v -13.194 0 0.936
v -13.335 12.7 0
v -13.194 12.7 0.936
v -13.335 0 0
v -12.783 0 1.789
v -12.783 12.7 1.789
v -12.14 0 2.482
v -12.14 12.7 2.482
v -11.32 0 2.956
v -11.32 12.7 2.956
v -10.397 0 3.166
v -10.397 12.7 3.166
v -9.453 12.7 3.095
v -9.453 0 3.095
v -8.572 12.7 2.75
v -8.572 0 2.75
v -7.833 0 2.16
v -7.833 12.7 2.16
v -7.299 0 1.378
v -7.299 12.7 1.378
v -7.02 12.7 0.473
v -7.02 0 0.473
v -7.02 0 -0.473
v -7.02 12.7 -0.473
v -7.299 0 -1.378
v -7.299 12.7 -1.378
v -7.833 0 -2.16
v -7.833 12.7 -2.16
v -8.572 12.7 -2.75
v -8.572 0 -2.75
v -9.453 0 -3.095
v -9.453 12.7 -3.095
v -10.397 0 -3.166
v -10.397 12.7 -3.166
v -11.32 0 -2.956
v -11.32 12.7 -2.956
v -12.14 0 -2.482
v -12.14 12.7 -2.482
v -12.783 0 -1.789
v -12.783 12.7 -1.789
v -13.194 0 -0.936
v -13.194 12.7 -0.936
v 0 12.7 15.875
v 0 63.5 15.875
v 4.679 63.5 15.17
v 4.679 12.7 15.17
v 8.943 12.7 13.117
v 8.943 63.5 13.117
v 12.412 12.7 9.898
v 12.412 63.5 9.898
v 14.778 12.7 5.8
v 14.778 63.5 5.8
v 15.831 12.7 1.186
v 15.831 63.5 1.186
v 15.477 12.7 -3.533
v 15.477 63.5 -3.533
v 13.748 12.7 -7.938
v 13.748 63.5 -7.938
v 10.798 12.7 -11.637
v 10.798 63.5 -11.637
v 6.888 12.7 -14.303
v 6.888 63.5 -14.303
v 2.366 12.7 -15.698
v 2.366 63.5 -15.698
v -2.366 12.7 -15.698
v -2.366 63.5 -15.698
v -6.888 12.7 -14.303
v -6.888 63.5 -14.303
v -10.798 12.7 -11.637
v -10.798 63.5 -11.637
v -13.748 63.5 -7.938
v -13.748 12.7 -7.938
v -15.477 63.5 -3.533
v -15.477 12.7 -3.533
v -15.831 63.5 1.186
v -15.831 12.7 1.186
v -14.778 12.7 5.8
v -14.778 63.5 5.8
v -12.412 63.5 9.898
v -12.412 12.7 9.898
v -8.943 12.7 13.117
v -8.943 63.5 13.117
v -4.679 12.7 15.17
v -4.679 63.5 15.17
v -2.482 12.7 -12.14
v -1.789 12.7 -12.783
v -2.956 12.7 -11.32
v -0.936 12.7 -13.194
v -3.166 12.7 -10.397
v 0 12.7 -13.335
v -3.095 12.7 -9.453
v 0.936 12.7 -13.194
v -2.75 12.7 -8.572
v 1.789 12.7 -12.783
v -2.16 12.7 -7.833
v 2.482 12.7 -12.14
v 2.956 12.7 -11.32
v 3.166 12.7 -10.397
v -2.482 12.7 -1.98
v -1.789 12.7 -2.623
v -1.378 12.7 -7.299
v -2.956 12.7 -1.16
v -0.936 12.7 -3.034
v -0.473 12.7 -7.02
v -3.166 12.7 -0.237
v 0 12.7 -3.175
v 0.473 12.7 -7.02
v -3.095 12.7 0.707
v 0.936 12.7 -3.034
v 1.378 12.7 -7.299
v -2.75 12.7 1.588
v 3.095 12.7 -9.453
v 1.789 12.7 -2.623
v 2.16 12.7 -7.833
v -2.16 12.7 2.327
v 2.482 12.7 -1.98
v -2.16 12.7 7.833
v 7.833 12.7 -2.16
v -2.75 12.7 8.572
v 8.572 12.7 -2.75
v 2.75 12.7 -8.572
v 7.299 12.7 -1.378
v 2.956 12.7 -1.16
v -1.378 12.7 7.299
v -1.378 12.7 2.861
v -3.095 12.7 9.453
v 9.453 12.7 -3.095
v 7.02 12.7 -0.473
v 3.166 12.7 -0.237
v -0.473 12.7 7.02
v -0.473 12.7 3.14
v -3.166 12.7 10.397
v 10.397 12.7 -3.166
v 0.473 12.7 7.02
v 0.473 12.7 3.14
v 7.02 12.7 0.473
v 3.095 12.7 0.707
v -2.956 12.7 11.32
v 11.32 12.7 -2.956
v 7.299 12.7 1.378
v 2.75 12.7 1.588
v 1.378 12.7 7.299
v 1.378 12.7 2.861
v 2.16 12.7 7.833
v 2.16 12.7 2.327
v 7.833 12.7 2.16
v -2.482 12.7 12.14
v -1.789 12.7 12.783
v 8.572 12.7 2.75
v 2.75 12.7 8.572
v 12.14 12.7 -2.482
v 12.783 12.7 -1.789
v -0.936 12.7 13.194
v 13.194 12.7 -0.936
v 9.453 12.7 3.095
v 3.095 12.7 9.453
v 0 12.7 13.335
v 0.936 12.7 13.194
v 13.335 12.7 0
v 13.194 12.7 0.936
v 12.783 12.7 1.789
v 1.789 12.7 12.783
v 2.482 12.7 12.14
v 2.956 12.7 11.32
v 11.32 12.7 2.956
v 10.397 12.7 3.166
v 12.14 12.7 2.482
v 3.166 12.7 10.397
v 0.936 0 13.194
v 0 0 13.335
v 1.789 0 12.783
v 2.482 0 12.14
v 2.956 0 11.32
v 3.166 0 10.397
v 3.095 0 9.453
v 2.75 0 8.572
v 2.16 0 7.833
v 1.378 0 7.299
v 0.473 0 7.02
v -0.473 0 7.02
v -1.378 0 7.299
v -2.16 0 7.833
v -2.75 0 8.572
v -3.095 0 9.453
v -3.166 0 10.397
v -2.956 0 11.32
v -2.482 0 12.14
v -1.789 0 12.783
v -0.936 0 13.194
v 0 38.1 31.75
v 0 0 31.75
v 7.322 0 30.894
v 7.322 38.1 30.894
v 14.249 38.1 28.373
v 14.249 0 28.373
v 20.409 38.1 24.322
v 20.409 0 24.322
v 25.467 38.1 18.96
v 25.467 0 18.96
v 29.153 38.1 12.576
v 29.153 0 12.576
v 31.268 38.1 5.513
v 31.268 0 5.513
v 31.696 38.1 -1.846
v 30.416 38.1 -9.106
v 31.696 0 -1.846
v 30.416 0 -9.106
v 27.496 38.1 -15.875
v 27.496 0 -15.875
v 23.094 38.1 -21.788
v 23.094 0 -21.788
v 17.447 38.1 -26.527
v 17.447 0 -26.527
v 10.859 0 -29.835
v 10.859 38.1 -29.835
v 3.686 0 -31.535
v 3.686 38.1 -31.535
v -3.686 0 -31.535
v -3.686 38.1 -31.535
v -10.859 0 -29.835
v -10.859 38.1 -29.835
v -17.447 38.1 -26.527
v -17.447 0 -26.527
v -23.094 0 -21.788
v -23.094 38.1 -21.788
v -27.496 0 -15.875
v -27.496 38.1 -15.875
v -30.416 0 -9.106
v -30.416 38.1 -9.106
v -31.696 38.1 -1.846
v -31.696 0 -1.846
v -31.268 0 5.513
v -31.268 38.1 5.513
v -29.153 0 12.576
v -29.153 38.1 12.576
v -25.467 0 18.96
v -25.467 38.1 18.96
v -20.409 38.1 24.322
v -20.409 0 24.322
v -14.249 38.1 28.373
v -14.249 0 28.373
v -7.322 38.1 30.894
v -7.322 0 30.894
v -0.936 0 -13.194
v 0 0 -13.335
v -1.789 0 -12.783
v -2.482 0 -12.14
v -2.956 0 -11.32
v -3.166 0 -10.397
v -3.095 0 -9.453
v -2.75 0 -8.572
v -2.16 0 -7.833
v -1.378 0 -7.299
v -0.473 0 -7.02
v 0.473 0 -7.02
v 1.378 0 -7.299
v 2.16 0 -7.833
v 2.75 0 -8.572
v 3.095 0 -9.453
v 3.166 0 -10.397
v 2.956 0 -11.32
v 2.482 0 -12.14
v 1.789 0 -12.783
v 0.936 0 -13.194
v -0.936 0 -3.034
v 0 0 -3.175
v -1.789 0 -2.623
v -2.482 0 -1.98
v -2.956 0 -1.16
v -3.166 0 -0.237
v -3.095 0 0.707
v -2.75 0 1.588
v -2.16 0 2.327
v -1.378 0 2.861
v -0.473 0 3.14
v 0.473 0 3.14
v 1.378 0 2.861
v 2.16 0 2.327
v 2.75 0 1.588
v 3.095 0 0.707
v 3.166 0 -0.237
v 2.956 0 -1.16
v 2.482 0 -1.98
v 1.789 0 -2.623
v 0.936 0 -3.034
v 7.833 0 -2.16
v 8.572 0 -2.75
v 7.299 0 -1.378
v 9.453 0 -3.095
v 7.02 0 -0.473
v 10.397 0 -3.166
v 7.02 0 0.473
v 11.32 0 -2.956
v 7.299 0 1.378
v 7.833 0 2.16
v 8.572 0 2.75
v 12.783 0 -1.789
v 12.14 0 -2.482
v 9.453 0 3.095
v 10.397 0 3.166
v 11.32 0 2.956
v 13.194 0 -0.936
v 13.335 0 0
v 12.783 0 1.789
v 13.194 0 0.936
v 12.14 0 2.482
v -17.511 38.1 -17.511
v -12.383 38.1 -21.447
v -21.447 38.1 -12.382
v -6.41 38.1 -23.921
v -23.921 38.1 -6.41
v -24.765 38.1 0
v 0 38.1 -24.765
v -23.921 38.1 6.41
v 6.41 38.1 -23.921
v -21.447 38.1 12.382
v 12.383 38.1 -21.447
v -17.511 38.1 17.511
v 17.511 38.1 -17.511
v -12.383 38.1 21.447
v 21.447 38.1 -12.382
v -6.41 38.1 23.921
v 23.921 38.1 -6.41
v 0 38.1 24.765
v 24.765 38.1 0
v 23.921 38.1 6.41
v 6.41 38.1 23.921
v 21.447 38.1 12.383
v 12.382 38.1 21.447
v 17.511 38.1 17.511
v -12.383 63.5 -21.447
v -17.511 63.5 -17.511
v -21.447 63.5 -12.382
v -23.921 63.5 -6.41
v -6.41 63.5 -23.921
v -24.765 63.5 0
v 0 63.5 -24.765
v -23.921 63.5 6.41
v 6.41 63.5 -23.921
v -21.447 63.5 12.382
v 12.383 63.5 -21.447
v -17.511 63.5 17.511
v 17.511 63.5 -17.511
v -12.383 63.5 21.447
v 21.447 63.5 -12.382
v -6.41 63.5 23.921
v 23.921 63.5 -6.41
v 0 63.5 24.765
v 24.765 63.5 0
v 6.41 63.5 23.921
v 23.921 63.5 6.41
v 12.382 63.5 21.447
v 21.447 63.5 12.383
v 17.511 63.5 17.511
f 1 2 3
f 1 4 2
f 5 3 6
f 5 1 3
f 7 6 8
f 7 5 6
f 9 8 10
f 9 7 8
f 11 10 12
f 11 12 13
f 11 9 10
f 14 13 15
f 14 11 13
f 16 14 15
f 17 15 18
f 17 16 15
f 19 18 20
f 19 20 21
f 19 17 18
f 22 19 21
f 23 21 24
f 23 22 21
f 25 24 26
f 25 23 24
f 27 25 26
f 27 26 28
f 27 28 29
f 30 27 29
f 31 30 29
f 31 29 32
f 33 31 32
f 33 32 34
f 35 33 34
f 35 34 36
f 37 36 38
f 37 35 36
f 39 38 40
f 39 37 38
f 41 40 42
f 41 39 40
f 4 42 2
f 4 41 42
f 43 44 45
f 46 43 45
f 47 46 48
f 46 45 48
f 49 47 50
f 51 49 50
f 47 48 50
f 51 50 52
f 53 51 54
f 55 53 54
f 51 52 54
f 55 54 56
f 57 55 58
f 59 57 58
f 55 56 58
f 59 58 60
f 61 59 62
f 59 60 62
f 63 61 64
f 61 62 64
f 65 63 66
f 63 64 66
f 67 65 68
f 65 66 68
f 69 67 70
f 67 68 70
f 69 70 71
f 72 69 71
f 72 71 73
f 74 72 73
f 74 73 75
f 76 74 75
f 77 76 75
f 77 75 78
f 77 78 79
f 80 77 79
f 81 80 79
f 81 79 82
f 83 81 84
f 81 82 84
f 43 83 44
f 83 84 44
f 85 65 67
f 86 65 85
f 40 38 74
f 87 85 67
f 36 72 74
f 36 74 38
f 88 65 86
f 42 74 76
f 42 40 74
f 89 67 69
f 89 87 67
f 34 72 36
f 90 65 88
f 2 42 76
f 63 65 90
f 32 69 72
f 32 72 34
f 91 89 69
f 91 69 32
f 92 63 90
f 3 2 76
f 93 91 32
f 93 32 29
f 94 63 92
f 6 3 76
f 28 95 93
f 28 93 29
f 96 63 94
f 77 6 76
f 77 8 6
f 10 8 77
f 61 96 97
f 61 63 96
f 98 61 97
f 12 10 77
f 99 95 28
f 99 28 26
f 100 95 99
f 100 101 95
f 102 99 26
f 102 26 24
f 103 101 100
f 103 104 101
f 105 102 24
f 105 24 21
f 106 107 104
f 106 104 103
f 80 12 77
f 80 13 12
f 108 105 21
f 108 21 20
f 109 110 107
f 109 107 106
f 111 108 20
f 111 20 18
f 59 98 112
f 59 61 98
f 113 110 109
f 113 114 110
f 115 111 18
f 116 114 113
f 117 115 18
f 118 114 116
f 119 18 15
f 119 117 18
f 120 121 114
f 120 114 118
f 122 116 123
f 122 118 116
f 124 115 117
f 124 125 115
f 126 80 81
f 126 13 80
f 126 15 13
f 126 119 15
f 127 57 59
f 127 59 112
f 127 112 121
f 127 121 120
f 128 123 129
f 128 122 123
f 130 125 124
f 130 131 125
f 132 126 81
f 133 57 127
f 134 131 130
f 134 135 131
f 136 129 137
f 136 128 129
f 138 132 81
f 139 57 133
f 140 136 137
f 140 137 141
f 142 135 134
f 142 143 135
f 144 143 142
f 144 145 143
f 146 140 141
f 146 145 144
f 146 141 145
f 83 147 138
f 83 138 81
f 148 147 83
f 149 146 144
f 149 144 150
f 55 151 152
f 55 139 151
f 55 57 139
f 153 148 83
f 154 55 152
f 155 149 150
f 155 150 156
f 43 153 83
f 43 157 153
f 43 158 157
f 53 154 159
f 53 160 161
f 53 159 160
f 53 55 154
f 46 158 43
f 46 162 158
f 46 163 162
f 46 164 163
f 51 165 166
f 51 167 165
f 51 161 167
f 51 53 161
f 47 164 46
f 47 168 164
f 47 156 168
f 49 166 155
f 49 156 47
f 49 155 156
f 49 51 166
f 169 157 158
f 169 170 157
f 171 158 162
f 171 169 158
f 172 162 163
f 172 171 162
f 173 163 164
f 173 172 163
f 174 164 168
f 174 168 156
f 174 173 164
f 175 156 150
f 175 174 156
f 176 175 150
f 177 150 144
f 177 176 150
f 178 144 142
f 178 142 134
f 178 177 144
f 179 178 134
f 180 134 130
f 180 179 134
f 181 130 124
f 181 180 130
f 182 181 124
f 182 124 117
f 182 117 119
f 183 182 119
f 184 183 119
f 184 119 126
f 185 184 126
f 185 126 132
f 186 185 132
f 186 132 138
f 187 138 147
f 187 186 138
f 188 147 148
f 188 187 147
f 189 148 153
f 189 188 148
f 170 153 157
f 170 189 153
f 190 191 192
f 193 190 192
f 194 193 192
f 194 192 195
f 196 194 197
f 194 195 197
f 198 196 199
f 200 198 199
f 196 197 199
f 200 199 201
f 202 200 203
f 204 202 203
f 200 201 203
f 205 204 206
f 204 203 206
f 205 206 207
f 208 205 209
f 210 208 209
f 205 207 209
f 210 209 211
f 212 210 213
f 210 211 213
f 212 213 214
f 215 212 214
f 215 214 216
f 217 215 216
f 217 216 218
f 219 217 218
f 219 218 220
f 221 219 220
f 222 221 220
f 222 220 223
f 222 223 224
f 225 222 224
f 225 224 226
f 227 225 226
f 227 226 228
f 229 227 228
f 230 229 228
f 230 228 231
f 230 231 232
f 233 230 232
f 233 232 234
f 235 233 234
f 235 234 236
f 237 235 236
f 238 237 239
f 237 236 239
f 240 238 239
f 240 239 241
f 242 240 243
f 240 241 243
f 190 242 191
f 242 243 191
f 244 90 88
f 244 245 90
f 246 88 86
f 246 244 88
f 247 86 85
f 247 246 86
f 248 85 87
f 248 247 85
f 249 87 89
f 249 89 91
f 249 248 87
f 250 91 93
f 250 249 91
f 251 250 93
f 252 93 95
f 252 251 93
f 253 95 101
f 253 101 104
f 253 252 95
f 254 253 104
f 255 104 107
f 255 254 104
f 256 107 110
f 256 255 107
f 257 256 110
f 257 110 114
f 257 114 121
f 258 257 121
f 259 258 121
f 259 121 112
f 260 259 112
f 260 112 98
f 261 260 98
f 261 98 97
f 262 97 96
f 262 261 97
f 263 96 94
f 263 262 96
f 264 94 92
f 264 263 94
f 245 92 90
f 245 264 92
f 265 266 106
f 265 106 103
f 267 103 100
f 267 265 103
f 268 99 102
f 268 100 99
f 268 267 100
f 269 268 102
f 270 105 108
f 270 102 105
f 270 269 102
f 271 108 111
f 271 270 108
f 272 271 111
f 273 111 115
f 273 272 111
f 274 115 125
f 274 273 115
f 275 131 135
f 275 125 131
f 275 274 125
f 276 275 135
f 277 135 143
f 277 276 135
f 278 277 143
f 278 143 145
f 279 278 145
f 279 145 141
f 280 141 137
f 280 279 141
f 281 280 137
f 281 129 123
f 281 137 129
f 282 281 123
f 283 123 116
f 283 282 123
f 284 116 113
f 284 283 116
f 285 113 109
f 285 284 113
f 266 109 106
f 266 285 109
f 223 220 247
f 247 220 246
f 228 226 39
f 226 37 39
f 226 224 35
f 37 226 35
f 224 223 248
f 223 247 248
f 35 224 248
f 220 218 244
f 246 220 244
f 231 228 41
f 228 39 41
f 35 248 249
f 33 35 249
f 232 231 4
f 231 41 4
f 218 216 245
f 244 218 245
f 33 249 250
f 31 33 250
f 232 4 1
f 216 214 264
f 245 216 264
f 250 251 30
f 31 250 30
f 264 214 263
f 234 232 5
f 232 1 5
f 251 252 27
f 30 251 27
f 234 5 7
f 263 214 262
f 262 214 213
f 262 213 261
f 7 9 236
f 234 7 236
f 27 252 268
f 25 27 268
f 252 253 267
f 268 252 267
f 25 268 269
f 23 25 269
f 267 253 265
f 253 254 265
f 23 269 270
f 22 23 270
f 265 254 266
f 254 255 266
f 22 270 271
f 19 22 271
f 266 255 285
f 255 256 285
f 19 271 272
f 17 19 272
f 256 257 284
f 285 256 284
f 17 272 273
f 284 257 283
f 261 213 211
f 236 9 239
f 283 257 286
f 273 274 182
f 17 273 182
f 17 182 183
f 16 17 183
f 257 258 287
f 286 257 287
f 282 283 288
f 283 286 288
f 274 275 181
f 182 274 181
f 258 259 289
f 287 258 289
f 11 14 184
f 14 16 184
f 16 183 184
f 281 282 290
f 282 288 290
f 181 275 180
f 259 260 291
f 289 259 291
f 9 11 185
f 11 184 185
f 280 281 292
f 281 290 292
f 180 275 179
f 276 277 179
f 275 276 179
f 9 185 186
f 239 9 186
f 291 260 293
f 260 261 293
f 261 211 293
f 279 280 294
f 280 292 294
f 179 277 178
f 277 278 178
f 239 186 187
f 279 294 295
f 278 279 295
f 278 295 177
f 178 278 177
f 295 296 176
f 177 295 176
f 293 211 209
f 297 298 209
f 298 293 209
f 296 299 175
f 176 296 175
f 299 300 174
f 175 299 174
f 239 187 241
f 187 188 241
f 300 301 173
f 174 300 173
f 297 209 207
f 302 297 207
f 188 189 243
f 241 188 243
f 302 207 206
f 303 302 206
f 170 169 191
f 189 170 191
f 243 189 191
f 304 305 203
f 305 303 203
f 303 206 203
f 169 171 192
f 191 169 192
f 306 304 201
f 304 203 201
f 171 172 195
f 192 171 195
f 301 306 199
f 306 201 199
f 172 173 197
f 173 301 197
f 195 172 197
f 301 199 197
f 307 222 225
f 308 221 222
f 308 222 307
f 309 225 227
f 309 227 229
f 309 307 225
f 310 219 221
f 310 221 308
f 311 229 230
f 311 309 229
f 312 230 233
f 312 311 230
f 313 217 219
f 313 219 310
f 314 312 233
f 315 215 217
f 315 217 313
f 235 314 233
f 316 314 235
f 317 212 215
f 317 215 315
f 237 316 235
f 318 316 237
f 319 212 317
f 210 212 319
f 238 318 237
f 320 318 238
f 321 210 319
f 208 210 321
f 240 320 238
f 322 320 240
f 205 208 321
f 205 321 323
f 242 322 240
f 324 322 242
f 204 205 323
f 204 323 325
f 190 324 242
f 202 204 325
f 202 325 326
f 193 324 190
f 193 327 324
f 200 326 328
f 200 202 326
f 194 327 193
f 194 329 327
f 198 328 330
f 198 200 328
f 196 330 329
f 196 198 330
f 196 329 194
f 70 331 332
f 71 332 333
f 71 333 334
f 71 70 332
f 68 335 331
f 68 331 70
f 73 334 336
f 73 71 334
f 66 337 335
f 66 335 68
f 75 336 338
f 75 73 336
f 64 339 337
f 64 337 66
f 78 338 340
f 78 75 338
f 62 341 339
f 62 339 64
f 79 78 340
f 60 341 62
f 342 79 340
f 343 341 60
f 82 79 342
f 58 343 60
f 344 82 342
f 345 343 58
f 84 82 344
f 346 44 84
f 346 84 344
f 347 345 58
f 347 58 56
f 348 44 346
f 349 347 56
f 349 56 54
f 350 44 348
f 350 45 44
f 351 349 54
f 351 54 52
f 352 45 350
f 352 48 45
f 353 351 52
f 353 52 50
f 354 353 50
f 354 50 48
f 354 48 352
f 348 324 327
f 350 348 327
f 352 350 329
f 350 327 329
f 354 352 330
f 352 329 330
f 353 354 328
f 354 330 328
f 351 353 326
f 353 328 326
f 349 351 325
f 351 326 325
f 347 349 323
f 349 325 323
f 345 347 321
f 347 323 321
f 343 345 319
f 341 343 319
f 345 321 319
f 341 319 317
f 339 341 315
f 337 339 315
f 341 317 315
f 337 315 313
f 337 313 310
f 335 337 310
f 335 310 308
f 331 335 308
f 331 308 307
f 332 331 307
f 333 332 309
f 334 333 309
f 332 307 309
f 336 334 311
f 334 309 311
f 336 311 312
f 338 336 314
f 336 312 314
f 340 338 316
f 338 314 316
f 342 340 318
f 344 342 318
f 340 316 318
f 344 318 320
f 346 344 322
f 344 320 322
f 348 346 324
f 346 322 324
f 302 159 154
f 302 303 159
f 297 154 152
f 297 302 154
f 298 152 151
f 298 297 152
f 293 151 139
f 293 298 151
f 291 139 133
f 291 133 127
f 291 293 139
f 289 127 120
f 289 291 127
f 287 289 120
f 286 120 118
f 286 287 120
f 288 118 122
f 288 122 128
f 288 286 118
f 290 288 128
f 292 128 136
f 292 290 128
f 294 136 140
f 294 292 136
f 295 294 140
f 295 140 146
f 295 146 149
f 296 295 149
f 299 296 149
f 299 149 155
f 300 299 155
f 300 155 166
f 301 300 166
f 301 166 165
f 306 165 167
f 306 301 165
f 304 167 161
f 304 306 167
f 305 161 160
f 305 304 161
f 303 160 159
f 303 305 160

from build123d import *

# Parameters (mm, degrees)
SKETCH1_R                            = 31.75
BOSS_EXTRUDE1_DEPTH                  = 63.5
CUT_EXTRUDE2_START                   = -25.4
SKETCH2_R                            = 31.75
SKETCH2_R_2                          = 24.765
CUT_EXTRUDE2_DEPTH                   = 25.4
SKETCH3_R                            = 15.875
CUT_EXTRUDE3_DEPTH                   = 50.8
F_1_4_0_25_DIAMETER_HOLE1_AT_2_COUNT = 2
F_1_4_0_25_DIAMETER_HOLE1_AT_2_PITCH = 10.16
CIRPATTERN1_COUNT                    = 4


with BuildPart() as part:
    # Sketch1 → Boss-Extrude1 (new body)
    with BuildSketch(Plane(origin=(0, 0, 0), x_dir=(1, 0, 0), z_dir=(0, 1, 0))):
        with Locations(Location((0, 0, 0), (0, 0, 270))):
            Circle(SKETCH1_R)
    extrude(amount=BOSS_EXTRUDE1_DEPTH)

    # Sketch2 → Cut-Extrude2 (cut)
    with BuildSketch(Plane(origin=(0, 63.5, 0), x_dir=(1, 0, 0), z_dir=(0, 1, 0)).offset(CUT_EXTRUDE2_START)):
        with Locations(Location((0, 0, 0), (0, 0, 270))):
            Circle(SKETCH2_R)
        with Locations(Location((0, 0, 0), (0, 0, 270))):
            Circle(SKETCH2_R_2, mode=Mode.SUBTRACT)
    extrude(amount=CUT_EXTRUDE2_DEPTH, mode=Mode.SUBTRACT)

    # Sketch3 → Cut-Extrude3 (cut)
    with BuildSketch(Plane(origin=(0, 63.5, 0), x_dir=(1, 0, 0), z_dir=(0, 1, 0))):
        with Locations(Location((0, 0, 0), (0, 0, 270))):
            Circle(SKETCH3_R)
    extrude(amount=-CUT_EXTRUDE3_DEPTH, mode=Mode.SUBTRACT)

    # Sketch9 → 1/4 (0.25) Diameter Hole1 (revolve, cut)
    with BuildSketch(Plane(origin=(0, 0, -10.16), x_dir=(0, 0, -1), z_dir=(1, 0, 0))):
        Polygon((0, 0), (0, 14.607732465), (3.175, 12.7), (3.175, 0), align=None)
    f_1_4_0_25_diameter_hole1 = revolve(axis=Axis((0, -6.35, -10.16), (0, 1, 0)), mode=Mode.SUBTRACT)

    # 1/4 (0.25) Diameter Hole1 at 2: 1/4 (0.25) Diameter Hole1 ×2
    with Locations(*[(0, 0, i * F_1_4_0_25_DIAMETER_HOLE1_AT_2_PITCH) for i in range(1, F_1_4_0_25_DIAMETER_HOLE1_AT_2_COUNT)]):
        add(f_1_4_0_25_diameter_hole1, mode=Mode.SUBTRACT)

    # CirPattern1: 1/4 (0.25) Diameter Hole1 ×4 about axis
    cirpattern1_axis = Axis((0, 0, 0), (0, 1, 0))
    for i in range(1, CIRPATTERN1_COUNT):
        add(f_1_4_0_25_diameter_hole1.rotate(cirpattern1_axis, i * 360 / CIRPATTERN1_COUNT), mode=Mode.SUBTRACT)

    # CirPattern1 copy 1 sketch → CirPattern1 copy 1 (revolve, cut)
    with BuildSketch(Plane(origin=(0, 0, 0), x_dir=(-1, 0, 0), z_dir=(0, 0, -1))):
        Polygon((0, 0), (0, 14.607732465), (3.175, 12.7), (3.175, 0), align=None)
    revolve(axis=Axis((0, -6.35, 0), (0, 1, 0)), mode=Mode.SUBTRACT)

    # CirPattern1 copy 2 sketch → CirPattern1 copy 2 (revolve, cut)
    with BuildSketch(Plane.ZY):
        Polygon((0, 0), (0, 14.607732465), (3.175, 12.7), (3.175, 0), align=None)
    revolve(axis=Axis((0, -6.35, 0), (0, 1, 0)), mode=Mode.SUBTRACT)

    # CirPattern1 copy 3 sketch → CirPattern1 copy 3 (revolve, cut)
    with BuildSketch(Plane.XY):
        Polygon((0, 0), (0, 14.607732465), (3.175, 12.7), (3.175, 0), align=None)
    revolve(axis=Axis((0, -6.35, 0), (0, 1, 0)), mode=Mode.SUBTRACT)


solid = part.part
